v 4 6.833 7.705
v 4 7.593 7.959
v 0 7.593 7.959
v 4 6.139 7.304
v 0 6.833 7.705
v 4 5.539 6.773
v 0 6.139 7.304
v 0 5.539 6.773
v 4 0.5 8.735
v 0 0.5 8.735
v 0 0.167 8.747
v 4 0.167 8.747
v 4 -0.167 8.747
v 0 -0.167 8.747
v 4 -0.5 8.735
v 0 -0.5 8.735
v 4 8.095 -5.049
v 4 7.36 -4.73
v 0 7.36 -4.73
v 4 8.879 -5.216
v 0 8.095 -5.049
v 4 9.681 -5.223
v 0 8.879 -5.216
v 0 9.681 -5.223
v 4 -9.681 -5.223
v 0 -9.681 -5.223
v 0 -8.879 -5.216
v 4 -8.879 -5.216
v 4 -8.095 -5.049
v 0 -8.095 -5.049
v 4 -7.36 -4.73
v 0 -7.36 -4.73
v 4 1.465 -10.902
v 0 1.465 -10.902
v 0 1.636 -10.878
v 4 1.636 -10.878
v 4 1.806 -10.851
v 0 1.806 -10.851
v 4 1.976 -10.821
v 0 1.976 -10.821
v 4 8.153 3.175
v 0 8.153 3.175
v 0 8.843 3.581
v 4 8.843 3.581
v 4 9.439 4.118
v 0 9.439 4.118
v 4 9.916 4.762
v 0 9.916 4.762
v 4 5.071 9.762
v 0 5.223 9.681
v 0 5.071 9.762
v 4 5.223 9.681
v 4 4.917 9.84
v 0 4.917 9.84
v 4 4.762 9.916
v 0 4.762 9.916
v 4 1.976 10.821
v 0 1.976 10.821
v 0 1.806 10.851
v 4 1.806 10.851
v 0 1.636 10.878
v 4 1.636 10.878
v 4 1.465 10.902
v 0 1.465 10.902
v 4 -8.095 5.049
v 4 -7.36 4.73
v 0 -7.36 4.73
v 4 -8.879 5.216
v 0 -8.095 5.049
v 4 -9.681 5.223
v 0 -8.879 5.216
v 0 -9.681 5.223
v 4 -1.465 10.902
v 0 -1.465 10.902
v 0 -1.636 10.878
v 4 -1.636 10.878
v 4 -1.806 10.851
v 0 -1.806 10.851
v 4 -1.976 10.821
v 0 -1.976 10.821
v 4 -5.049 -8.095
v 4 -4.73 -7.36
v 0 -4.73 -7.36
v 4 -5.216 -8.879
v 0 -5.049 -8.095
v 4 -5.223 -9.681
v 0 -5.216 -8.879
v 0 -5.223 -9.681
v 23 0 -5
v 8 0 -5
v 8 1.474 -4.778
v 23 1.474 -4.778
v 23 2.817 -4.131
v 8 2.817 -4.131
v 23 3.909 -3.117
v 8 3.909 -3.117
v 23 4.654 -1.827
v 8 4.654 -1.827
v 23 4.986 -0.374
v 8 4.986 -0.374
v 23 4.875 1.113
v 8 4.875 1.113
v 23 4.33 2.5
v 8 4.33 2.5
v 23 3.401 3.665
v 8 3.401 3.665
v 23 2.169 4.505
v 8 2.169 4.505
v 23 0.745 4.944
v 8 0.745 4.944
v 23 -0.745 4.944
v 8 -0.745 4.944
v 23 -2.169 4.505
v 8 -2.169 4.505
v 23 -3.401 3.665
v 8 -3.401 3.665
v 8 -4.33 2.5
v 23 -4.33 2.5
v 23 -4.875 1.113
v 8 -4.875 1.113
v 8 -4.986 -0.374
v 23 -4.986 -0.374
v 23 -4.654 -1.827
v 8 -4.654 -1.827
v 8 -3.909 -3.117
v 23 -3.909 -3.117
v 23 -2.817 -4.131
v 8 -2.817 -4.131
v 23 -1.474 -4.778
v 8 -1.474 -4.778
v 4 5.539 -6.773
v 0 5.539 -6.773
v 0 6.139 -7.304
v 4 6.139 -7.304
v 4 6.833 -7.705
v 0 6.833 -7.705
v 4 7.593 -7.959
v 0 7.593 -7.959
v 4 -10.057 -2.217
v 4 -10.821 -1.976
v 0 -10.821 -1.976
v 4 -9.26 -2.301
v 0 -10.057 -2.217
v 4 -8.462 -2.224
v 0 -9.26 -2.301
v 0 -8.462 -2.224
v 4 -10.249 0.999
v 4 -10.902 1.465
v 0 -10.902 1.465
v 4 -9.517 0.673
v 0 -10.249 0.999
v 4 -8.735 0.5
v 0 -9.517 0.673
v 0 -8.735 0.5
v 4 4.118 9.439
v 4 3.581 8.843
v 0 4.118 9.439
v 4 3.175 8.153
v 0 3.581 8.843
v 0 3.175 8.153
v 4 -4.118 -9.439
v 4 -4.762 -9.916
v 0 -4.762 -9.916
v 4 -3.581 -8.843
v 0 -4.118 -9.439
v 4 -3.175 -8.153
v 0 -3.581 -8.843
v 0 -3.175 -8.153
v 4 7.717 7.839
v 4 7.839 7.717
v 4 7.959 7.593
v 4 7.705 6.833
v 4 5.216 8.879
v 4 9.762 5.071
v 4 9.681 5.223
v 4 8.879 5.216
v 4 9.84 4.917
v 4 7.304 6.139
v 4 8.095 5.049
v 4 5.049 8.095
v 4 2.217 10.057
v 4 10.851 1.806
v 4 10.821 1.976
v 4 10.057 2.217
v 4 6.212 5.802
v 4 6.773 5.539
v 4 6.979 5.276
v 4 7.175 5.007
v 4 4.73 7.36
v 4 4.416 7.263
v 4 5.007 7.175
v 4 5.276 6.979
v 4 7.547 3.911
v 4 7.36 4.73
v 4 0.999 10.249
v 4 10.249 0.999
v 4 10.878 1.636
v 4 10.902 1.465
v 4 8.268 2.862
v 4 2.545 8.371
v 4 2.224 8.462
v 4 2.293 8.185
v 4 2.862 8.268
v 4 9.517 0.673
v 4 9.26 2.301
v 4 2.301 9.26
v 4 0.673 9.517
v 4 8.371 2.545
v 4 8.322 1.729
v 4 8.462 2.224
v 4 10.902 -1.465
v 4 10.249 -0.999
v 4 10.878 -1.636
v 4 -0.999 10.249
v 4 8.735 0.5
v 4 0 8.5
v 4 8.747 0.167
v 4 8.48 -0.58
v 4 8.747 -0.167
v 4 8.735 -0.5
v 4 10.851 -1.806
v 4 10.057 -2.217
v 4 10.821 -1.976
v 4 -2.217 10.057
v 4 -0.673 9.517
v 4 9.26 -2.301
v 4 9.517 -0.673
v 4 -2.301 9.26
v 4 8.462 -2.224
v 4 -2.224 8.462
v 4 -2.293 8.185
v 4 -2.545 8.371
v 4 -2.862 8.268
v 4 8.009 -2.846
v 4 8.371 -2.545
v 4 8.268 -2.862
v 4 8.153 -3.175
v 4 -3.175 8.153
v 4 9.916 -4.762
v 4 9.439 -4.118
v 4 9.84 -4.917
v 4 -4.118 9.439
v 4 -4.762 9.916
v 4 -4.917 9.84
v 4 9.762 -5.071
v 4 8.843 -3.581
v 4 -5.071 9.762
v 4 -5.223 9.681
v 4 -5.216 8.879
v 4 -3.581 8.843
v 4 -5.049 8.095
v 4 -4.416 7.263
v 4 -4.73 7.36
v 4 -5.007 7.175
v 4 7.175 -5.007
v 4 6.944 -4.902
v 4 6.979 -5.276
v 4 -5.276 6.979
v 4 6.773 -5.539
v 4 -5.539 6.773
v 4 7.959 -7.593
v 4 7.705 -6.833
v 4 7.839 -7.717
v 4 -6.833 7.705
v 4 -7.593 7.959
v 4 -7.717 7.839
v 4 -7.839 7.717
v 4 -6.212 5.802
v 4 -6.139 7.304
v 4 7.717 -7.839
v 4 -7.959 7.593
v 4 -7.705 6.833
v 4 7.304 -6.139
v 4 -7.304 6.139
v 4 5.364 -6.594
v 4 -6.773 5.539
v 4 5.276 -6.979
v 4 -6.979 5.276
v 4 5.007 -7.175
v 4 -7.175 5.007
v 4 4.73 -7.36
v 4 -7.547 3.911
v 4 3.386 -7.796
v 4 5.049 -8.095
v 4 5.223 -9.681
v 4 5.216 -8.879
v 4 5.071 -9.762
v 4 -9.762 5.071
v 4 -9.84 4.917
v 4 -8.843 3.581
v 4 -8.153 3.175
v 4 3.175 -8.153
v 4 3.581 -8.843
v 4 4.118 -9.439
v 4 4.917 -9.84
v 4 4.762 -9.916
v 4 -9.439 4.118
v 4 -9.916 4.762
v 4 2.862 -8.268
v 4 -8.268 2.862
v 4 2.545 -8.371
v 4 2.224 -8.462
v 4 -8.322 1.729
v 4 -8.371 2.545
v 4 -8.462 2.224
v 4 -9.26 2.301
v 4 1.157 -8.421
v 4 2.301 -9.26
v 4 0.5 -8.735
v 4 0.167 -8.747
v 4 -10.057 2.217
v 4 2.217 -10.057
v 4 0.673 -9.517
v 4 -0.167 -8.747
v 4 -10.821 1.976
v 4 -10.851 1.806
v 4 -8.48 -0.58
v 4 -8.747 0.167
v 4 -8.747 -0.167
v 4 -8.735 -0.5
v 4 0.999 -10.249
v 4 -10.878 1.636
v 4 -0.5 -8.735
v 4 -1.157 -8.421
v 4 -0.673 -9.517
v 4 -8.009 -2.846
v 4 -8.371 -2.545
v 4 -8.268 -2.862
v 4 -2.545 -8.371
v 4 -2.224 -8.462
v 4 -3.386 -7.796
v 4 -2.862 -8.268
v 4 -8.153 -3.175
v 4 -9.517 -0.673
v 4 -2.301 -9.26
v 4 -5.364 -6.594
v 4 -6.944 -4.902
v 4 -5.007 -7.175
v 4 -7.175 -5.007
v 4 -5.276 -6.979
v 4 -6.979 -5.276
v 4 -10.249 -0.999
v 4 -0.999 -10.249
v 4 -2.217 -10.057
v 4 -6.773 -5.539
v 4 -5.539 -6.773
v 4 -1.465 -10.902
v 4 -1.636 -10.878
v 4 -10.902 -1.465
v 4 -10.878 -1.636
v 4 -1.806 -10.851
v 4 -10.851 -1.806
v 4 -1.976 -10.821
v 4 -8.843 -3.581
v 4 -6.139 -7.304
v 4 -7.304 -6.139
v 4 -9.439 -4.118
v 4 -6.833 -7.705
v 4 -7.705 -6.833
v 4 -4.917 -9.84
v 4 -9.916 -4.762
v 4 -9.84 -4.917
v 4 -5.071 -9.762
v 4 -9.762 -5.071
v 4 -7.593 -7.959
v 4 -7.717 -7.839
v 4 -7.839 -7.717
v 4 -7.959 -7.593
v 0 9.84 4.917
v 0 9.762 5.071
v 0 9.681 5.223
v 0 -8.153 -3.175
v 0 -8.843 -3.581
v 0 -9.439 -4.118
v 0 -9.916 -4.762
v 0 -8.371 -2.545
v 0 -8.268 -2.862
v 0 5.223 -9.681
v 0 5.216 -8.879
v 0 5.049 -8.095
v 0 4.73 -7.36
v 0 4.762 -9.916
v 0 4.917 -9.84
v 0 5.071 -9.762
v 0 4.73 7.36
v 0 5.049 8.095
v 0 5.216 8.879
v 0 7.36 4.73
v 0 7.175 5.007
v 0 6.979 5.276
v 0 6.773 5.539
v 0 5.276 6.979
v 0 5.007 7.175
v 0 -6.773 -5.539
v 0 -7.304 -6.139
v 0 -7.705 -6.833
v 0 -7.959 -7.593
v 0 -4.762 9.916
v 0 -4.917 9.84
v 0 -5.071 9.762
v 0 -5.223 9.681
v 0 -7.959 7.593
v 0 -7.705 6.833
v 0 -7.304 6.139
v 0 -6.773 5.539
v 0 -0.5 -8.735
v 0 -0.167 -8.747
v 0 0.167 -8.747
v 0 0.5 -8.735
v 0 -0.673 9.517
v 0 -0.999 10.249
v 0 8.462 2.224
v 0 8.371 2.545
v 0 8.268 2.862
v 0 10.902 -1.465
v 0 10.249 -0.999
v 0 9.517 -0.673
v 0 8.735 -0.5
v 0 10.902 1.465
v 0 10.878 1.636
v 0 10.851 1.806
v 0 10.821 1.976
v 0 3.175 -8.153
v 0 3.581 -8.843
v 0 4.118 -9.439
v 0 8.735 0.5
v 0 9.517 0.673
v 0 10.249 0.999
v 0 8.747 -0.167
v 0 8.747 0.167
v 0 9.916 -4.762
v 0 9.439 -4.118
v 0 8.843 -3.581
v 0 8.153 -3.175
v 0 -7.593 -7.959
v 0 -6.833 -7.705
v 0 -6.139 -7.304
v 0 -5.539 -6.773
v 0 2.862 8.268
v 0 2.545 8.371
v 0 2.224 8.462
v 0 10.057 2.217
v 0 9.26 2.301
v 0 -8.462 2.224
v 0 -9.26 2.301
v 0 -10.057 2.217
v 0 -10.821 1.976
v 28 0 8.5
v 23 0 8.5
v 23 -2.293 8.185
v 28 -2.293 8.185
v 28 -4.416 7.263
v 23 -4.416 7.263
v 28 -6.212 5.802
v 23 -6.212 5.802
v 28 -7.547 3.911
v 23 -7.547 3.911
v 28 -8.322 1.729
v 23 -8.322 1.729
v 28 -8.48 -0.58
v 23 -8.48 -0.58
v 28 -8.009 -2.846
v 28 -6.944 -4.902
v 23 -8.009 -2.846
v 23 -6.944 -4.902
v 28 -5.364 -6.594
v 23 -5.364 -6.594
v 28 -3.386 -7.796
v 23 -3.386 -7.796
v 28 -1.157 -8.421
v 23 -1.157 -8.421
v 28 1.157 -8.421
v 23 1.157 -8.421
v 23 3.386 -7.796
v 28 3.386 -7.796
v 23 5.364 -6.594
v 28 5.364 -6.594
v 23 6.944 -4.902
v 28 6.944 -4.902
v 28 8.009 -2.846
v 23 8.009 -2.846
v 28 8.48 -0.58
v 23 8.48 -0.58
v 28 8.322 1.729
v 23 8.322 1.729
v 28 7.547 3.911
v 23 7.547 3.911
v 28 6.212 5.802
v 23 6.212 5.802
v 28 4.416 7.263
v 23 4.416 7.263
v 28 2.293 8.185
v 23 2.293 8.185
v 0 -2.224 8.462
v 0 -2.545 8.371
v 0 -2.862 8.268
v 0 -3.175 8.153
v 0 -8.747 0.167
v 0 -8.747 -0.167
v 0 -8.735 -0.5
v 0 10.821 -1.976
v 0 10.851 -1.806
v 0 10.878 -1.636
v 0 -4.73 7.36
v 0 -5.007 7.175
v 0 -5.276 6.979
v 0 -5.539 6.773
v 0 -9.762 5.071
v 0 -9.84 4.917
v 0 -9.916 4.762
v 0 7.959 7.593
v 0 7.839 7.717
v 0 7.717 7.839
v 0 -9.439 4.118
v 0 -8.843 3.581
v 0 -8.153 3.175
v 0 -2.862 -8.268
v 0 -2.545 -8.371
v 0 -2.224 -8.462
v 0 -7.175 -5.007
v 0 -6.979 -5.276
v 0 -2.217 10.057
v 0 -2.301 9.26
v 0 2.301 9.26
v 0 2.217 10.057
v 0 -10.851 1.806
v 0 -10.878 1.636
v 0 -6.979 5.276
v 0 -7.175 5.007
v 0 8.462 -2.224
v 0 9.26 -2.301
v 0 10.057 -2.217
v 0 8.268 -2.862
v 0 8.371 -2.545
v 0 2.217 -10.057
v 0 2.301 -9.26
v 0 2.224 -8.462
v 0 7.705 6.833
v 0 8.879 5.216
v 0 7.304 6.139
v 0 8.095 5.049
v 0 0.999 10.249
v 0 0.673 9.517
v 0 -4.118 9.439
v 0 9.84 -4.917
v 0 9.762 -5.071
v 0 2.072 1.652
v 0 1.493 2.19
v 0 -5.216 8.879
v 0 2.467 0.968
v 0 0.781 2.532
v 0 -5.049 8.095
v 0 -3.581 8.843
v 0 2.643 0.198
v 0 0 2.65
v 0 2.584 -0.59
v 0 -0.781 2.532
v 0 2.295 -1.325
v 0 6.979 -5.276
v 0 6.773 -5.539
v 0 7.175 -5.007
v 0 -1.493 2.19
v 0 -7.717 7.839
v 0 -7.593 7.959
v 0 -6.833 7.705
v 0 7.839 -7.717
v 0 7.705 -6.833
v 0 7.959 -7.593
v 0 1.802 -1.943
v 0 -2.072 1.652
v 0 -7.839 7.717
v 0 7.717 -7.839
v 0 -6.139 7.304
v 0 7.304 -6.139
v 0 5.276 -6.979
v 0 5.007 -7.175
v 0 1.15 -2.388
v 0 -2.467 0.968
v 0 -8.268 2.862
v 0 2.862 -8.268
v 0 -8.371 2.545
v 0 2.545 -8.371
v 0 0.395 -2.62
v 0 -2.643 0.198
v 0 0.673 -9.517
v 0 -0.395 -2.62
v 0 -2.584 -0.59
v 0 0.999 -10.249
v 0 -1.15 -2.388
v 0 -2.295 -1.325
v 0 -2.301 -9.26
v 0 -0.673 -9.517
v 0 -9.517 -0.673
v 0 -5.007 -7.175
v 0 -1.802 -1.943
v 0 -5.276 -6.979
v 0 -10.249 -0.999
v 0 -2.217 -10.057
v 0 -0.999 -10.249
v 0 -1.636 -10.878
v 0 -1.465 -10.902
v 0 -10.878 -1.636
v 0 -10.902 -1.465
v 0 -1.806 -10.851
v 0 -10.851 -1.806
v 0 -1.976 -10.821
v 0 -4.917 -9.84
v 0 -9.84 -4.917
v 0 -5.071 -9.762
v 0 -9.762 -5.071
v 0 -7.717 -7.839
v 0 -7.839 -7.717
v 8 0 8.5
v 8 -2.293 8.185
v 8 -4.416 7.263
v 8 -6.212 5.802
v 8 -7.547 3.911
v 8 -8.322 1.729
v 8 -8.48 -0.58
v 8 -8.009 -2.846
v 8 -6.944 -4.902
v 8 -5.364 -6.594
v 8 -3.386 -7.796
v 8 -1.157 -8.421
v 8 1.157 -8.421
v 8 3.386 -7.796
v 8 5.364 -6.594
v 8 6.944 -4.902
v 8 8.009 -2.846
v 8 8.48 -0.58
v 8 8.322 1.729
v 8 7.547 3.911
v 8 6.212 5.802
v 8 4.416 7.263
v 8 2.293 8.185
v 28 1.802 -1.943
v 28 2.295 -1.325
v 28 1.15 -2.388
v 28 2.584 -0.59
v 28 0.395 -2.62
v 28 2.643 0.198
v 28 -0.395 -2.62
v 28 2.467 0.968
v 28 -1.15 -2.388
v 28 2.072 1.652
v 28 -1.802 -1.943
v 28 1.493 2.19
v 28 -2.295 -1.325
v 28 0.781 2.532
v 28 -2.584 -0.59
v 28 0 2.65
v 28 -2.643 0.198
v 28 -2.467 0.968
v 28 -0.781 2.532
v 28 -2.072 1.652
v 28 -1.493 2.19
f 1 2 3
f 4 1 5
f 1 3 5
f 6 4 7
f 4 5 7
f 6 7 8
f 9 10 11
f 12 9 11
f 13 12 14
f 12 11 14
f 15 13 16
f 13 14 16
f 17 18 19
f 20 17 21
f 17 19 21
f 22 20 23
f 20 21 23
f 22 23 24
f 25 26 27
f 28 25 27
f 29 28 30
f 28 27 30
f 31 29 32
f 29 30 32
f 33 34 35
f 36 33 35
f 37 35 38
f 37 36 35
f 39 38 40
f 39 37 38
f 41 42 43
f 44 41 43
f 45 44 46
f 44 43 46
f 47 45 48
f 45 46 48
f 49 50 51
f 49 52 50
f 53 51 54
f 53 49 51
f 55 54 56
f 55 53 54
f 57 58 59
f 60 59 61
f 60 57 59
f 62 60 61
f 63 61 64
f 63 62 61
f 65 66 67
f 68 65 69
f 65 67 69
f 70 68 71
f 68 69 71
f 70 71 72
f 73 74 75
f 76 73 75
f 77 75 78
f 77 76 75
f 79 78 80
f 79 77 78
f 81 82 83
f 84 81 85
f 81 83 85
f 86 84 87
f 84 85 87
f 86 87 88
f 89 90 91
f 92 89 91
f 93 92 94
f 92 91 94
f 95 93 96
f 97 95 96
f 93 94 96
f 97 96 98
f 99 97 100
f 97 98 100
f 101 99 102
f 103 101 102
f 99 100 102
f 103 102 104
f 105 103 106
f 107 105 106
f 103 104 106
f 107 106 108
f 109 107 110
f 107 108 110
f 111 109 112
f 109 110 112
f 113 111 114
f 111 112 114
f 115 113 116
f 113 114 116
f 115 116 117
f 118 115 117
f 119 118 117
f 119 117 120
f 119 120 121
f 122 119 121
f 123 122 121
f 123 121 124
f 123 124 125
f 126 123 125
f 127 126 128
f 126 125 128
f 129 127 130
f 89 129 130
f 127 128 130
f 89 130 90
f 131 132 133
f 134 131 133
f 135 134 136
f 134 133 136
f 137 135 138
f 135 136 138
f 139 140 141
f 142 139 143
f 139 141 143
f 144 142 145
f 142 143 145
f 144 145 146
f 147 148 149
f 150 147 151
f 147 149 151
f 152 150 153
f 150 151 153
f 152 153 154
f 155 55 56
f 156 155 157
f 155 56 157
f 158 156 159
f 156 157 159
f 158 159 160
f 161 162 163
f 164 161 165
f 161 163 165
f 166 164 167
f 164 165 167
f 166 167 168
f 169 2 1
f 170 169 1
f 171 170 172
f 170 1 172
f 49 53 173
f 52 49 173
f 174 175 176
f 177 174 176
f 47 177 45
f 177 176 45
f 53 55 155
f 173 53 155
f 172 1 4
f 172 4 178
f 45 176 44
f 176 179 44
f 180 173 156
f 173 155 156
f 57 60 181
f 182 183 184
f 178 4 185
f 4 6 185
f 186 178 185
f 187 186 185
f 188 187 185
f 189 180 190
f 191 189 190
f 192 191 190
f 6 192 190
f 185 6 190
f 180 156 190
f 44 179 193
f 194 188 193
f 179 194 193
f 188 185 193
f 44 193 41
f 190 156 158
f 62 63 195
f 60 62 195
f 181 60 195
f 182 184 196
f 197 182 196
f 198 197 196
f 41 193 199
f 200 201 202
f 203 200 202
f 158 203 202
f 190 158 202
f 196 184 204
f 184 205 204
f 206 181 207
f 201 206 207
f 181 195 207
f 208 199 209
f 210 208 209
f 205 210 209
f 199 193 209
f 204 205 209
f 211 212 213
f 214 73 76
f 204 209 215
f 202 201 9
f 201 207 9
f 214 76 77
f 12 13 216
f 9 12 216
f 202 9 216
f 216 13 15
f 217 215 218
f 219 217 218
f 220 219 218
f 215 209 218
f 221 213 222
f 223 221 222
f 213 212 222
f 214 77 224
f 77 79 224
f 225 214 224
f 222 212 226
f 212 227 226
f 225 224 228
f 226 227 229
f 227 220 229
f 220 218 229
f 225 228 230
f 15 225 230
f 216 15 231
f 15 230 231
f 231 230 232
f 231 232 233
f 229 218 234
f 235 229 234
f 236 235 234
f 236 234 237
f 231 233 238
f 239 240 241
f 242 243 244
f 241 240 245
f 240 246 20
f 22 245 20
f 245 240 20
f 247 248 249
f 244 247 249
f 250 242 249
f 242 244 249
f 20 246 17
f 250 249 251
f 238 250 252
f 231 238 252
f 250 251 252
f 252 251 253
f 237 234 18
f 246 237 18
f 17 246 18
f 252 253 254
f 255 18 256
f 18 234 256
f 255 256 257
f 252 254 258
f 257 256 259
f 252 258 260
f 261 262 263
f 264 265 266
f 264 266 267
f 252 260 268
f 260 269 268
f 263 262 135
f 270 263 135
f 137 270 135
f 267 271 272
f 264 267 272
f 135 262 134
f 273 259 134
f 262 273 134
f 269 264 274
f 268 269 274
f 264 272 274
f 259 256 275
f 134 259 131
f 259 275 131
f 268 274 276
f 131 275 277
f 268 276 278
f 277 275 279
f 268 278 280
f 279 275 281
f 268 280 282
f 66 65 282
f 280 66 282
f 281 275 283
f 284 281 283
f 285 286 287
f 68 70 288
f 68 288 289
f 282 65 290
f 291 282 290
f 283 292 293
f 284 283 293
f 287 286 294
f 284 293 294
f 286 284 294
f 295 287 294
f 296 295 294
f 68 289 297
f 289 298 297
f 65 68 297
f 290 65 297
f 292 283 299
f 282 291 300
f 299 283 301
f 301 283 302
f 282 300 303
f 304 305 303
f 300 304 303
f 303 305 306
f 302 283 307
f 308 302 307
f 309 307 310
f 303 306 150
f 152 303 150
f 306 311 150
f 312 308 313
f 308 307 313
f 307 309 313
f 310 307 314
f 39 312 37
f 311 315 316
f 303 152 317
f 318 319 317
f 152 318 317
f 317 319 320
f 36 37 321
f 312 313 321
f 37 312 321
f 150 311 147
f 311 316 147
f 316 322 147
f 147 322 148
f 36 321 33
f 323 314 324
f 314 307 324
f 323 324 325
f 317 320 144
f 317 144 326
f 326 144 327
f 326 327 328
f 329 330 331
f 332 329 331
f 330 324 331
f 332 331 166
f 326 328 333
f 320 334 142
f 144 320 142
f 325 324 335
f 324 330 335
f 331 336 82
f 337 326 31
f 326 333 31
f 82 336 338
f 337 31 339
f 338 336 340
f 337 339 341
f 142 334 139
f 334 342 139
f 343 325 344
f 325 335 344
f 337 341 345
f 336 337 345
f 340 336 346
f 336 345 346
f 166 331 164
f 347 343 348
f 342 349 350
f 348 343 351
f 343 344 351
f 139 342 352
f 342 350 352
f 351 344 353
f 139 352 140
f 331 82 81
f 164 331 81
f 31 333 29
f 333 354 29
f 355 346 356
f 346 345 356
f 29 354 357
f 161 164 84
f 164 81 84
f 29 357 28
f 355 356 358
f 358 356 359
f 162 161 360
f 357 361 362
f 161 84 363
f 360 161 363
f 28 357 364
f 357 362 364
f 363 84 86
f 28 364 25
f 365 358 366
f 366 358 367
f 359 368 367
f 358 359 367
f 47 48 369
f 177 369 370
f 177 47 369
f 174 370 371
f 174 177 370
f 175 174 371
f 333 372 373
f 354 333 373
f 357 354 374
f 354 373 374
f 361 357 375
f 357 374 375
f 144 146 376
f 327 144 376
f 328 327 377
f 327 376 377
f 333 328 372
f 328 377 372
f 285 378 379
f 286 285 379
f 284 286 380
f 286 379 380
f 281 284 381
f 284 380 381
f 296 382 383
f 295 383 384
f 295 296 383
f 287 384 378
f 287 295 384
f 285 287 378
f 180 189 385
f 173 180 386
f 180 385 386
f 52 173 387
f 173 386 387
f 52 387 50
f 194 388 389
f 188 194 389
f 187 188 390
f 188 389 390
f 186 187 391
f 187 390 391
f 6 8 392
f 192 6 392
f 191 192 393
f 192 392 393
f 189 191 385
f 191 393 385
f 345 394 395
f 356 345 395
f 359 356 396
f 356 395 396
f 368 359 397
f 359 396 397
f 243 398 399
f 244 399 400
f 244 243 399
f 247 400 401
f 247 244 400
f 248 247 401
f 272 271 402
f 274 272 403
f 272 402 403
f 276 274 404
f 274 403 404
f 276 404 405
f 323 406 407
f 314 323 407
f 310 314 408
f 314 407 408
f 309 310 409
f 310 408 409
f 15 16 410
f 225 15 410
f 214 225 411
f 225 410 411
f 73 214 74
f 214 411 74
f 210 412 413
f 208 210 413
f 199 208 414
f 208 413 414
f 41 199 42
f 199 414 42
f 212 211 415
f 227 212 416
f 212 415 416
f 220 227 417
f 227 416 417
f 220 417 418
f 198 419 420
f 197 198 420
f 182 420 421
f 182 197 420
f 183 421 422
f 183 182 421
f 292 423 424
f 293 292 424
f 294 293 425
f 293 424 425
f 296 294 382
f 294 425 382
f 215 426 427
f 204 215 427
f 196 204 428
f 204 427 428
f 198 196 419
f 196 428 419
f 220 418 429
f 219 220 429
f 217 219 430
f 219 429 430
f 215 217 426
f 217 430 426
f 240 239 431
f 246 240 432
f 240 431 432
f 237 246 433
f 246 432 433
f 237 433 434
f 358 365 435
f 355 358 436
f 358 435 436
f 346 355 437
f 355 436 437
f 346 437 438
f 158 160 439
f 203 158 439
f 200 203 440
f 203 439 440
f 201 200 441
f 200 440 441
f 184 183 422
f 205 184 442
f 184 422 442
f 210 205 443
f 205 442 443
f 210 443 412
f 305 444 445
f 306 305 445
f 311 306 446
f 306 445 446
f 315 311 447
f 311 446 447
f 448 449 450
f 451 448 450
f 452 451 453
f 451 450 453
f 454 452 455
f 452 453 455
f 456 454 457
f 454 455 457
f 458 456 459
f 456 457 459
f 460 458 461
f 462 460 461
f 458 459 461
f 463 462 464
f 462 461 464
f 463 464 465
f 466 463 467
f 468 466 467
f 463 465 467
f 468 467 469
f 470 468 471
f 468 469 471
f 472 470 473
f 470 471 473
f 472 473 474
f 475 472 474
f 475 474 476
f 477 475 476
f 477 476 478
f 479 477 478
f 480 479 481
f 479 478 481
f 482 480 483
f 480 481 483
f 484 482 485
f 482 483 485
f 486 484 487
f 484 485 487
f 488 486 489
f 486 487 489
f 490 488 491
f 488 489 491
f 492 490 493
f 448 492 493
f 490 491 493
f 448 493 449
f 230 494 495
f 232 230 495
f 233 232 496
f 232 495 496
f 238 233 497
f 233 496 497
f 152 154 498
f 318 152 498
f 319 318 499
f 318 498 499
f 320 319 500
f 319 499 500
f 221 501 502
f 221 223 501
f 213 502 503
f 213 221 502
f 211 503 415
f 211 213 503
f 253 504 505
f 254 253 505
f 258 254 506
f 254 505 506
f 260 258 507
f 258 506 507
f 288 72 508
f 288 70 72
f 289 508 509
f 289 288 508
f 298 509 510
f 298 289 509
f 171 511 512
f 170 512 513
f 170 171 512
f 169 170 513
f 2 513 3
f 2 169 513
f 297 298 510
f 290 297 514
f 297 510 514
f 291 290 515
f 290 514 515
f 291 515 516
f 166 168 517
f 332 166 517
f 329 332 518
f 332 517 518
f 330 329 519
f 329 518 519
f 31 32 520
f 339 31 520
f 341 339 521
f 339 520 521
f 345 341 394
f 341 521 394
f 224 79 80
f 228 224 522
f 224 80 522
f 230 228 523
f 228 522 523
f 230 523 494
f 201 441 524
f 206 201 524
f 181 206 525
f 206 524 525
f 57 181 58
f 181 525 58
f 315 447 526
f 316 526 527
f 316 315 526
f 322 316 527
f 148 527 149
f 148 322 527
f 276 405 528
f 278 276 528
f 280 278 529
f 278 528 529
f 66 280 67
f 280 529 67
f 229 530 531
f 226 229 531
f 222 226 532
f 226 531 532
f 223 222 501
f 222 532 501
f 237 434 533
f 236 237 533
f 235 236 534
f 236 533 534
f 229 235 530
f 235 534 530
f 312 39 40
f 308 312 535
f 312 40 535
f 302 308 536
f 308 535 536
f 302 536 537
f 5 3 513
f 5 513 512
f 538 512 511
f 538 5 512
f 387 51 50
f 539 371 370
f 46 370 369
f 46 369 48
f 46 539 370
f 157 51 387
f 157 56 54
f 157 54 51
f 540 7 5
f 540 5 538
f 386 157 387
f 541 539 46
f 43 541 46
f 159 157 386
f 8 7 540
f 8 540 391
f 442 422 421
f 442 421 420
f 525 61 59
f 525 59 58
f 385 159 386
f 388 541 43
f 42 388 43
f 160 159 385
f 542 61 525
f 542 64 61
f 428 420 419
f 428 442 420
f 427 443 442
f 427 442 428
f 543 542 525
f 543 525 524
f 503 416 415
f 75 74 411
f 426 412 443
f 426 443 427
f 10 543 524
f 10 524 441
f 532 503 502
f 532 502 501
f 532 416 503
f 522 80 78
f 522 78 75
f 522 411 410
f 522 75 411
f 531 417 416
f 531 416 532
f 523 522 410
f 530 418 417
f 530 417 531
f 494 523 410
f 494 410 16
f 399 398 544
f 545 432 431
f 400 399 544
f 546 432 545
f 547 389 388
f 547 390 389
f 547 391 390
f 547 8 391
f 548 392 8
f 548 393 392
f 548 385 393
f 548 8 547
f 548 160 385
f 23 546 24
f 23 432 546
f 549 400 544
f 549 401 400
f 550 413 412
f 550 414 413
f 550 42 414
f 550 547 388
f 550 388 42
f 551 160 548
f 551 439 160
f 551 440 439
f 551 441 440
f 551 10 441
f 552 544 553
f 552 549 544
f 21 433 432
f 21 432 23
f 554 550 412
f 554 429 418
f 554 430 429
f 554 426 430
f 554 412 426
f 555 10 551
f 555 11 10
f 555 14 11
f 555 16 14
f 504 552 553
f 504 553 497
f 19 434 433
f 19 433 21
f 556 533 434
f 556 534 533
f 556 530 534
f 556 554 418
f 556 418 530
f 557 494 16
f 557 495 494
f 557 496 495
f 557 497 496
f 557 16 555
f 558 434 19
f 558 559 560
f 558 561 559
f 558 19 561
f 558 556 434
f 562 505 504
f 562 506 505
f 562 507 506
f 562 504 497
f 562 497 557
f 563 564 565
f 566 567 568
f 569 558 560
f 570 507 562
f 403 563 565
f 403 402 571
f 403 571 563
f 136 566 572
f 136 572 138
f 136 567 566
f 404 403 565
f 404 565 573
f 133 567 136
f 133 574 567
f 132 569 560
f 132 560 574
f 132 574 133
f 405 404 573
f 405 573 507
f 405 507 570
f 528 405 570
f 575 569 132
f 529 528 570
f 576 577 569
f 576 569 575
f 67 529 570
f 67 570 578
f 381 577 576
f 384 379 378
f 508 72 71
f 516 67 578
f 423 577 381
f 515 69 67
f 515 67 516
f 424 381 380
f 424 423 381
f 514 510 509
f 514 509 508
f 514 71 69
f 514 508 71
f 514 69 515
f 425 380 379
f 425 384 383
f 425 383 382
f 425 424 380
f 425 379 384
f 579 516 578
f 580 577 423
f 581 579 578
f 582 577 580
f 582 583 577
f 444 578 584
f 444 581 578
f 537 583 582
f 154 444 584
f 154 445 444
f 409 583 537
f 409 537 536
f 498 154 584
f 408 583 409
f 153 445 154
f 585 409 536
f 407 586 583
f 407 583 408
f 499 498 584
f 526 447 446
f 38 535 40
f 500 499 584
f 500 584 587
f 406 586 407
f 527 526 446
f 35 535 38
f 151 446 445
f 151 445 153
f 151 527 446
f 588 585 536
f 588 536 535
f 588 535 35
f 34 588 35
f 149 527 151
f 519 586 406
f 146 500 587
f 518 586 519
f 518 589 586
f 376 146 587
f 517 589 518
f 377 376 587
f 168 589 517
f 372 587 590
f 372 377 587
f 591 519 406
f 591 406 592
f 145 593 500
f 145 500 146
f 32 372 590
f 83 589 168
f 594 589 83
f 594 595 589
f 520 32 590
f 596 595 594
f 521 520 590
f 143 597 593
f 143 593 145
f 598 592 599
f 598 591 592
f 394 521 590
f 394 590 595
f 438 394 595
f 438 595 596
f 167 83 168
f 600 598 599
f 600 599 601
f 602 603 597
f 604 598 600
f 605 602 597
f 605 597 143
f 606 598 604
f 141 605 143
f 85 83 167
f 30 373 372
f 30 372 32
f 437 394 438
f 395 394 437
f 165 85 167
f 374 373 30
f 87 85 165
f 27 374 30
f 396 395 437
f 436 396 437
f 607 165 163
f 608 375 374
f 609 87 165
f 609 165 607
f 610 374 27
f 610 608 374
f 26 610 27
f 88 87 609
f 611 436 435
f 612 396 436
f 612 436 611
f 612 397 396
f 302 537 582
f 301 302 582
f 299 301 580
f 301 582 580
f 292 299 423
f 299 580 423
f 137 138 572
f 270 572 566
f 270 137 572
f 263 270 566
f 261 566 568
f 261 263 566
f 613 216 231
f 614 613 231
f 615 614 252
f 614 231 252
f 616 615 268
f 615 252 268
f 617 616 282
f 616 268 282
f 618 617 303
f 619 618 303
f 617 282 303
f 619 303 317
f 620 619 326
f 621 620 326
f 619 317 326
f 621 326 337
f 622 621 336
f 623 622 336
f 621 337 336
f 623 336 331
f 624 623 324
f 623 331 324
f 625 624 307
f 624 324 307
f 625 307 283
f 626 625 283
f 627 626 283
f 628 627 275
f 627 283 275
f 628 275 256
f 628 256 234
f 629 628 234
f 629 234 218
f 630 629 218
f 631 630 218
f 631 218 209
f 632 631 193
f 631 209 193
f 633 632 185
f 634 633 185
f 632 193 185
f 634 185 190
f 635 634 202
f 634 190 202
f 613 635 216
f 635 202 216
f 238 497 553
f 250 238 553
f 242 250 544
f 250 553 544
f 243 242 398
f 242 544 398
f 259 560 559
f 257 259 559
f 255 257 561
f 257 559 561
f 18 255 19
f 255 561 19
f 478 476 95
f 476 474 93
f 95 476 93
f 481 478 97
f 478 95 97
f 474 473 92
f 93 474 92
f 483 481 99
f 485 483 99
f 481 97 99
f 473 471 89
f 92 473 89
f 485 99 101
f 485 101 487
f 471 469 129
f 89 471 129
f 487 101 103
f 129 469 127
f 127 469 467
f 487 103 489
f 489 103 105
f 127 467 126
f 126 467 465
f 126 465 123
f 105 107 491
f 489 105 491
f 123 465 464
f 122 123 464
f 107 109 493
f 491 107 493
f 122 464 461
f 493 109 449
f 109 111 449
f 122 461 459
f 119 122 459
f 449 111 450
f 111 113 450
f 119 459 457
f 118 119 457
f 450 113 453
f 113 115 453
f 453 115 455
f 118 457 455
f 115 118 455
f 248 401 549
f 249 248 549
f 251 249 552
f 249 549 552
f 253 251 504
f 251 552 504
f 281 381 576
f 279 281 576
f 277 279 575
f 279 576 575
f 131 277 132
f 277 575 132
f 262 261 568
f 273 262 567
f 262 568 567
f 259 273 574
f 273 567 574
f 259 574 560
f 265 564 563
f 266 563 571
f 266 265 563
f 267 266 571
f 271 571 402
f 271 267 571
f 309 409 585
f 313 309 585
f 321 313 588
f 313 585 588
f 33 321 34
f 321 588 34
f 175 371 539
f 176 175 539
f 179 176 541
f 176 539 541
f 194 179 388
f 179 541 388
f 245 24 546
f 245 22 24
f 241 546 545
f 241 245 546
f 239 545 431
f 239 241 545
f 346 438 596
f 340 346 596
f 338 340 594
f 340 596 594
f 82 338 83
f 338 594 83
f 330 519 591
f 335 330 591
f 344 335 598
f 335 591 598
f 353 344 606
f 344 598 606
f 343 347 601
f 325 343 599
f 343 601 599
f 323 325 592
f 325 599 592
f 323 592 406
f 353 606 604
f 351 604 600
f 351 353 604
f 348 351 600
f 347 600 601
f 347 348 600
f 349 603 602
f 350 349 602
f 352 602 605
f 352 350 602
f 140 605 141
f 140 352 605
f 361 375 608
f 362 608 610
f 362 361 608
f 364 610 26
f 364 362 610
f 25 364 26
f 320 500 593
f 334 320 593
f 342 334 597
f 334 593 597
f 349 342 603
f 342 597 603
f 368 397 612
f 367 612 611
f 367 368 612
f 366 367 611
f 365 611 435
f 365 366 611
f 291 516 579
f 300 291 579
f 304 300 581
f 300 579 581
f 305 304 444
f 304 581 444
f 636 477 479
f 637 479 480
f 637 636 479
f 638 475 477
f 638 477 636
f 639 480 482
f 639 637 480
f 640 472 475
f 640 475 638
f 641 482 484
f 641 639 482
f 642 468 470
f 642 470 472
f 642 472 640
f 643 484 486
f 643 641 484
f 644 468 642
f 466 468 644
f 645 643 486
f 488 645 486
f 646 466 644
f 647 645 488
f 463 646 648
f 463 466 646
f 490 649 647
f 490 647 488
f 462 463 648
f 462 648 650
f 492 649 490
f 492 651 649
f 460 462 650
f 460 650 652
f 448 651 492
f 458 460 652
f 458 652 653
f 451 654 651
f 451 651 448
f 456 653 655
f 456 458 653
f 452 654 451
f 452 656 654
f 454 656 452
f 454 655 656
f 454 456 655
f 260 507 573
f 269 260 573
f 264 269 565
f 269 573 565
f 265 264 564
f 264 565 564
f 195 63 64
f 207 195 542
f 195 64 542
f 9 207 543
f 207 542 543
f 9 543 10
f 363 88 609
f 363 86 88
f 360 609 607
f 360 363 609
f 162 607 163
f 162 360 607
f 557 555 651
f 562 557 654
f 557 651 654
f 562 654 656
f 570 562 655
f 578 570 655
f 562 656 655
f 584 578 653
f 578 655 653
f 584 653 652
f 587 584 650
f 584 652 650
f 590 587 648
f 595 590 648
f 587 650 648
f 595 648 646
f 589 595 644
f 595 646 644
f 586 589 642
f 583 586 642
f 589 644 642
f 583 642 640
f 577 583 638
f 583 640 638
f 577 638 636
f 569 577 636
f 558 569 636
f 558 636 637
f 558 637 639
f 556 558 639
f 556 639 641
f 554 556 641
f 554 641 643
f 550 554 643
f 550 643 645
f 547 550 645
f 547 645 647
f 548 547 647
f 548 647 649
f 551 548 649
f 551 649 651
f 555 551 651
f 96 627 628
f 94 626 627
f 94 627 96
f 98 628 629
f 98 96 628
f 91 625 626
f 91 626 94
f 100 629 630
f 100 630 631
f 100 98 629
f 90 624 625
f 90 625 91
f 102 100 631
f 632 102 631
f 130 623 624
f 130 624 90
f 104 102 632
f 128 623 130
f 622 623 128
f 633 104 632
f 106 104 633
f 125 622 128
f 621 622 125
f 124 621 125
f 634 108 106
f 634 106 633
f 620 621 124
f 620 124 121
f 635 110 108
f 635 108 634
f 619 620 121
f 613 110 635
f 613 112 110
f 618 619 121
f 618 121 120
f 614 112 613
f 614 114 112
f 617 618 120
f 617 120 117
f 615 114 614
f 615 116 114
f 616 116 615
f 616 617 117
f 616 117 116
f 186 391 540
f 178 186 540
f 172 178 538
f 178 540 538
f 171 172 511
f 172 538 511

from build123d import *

# Parameters (mm, degrees)
BASPROSKE_W             = 4
BASPROSKE_H             = 11
TOOTHCUT_DEPTH          = 17.062378404
TEETHCUTS_COUNT         = 20
TEETHCUTS_ANGLE         = 342
BORSKE_R                = 2.5
BORE_DEPTH              = 50.0000508
SKETCH1_R               = 8.5
BOSS_EXTRUDE1_DEPTH     = 4
SKETCH2_R               = 5
BOSS_EXTRUDE2_DEPTH     = 15
SKETCH3_R               = 8.5
BOSS_EXTRUDE3_DEPTH     = 5
SKETCH4_R               = 2.65
CUT_EXTRUDE1_DEPTH      = 32.964164392
CUT_EXTRUDE1_DEPTH_BACK = 32.964164392


with BuildPart() as part:
    # BasProSke → Base-Revolve (revolve)
    with BuildSketch(Plane(origin=(0, 0, 0), x_dir=(1, 0, 0), z_dir=(0, 1, 0)), mode=Mode.PRIVATE) as base_revolve_sk:
        with Locations((2, 5.5)):
            Rectangle(BASPROSKE_W, BASPROSKE_H)
    revolve(base_revolve_sk.sketch.rotate(Axis((-10, 0, 0), (1, 0, 0)), 180), axis=Axis((-10, 0, 0), (1, 0, 0)))

    # TooCutSke → ToothCut (cut, through all)
    with BuildSketch(Plane(origin=(0, 0, 0), x_dir=(0, 0, -1), z_dir=(1, 0, 0))):
        with BuildLine():
            ThreePointArc((0.499924007, 8.734705318), (0, 8.749), (-0.499924007, 8.734705318))
            ThreePointArc((-0.499924007, 8.734705318), (-0.824302243, 9.905497836), (-1.485192705, 10.924909509))
            ThreePointArc((-1.485192705, 10.924909509), (0, 11.0254), (1.485192705, 10.924909509))
            ThreePointArc((1.485192705, 10.924909509), (0.824302243, 9.905497836), (0.499924007, 8.734705318))
        make_face()
    toothcut = extrude(amount=TOOTHCUT_DEPTH, mode=Mode.SUBTRACT)

    # TeethCuts: ToothCut ×20 about axis
    teethcuts_axis = Axis((-10, 0, 0), (1, 0, 0))
    for i in range(1, TEETHCUTS_COUNT):
        add(toothcut.rotate(teethcuts_axis, i * TEETHCUTS_ANGLE / (TEETHCUTS_COUNT - 1)), mode=Mode.SUBTRACT)

    # BorSke → Bore (cut, symmetric)
    with BuildSketch(Plane(origin=(0, 0, 0), x_dir=(0, 0, -1), z_dir=(1, 0, 0))):
        with Locations(Location((0, 0, 0), (0, 0, 180))):
            Circle(BORSKE_R)
    extrude(amount=BORE_DEPTH, both=True, mode=Mode.SUBTRACT)

    # Sketch1 → Boss-Extrude1 (add)
    with BuildSketch(Plane(origin=(4, 0, 0), x_dir=(0, 0, -1), z_dir=(1, 0, 0))):
        with Locations(Location((0, 0, 0), (0, 0, 180))):
            Circle(SKETCH1_R)
    extrude(amount=BOSS_EXTRUDE1_DEPTH)

    # Sketch2 → Boss-Extrude2 (add)
    with BuildSketch(Plane(origin=(8, 0, 0), x_dir=(0, 0, -1), z_dir=(1, 0, 0))):
        Circle(SKETCH2_R)
    extrude(amount=BOSS_EXTRUDE2_DEPTH)

    # Sketch3 → Boss-Extrude3 (add)
    with BuildSketch(Plane(origin=(23, 0, 0), x_dir=(0, 0, -1), z_dir=(1, 0, 0))):
        with Locations(Location((0, 0, 0), (0, 0, 180))):
            Circle(SKETCH3_R)
    extrude(amount=BOSS_EXTRUDE3_DEPTH)

    # Sketch4 → Cut-Extrude1 (cut, two sides)
    with BuildSketch(Plane(origin=(28, 0, 0), x_dir=(0, 0, -1), z_dir=(1, 0, 0))) as cut_extrude1_sk:
        with Locations(Location((0, 0, 0), (0, 0, 180))):
            Circle(SKETCH4_R)
    extrude(amount=CUT_EXTRUDE1_DEPTH, mode=Mode.SUBTRACT)
    extrude(cut_extrude1_sk.sketch, amount=-CUT_EXTRUDE1_DEPTH_BACK, mode=Mode.SUBTRACT)


solid = part.part
